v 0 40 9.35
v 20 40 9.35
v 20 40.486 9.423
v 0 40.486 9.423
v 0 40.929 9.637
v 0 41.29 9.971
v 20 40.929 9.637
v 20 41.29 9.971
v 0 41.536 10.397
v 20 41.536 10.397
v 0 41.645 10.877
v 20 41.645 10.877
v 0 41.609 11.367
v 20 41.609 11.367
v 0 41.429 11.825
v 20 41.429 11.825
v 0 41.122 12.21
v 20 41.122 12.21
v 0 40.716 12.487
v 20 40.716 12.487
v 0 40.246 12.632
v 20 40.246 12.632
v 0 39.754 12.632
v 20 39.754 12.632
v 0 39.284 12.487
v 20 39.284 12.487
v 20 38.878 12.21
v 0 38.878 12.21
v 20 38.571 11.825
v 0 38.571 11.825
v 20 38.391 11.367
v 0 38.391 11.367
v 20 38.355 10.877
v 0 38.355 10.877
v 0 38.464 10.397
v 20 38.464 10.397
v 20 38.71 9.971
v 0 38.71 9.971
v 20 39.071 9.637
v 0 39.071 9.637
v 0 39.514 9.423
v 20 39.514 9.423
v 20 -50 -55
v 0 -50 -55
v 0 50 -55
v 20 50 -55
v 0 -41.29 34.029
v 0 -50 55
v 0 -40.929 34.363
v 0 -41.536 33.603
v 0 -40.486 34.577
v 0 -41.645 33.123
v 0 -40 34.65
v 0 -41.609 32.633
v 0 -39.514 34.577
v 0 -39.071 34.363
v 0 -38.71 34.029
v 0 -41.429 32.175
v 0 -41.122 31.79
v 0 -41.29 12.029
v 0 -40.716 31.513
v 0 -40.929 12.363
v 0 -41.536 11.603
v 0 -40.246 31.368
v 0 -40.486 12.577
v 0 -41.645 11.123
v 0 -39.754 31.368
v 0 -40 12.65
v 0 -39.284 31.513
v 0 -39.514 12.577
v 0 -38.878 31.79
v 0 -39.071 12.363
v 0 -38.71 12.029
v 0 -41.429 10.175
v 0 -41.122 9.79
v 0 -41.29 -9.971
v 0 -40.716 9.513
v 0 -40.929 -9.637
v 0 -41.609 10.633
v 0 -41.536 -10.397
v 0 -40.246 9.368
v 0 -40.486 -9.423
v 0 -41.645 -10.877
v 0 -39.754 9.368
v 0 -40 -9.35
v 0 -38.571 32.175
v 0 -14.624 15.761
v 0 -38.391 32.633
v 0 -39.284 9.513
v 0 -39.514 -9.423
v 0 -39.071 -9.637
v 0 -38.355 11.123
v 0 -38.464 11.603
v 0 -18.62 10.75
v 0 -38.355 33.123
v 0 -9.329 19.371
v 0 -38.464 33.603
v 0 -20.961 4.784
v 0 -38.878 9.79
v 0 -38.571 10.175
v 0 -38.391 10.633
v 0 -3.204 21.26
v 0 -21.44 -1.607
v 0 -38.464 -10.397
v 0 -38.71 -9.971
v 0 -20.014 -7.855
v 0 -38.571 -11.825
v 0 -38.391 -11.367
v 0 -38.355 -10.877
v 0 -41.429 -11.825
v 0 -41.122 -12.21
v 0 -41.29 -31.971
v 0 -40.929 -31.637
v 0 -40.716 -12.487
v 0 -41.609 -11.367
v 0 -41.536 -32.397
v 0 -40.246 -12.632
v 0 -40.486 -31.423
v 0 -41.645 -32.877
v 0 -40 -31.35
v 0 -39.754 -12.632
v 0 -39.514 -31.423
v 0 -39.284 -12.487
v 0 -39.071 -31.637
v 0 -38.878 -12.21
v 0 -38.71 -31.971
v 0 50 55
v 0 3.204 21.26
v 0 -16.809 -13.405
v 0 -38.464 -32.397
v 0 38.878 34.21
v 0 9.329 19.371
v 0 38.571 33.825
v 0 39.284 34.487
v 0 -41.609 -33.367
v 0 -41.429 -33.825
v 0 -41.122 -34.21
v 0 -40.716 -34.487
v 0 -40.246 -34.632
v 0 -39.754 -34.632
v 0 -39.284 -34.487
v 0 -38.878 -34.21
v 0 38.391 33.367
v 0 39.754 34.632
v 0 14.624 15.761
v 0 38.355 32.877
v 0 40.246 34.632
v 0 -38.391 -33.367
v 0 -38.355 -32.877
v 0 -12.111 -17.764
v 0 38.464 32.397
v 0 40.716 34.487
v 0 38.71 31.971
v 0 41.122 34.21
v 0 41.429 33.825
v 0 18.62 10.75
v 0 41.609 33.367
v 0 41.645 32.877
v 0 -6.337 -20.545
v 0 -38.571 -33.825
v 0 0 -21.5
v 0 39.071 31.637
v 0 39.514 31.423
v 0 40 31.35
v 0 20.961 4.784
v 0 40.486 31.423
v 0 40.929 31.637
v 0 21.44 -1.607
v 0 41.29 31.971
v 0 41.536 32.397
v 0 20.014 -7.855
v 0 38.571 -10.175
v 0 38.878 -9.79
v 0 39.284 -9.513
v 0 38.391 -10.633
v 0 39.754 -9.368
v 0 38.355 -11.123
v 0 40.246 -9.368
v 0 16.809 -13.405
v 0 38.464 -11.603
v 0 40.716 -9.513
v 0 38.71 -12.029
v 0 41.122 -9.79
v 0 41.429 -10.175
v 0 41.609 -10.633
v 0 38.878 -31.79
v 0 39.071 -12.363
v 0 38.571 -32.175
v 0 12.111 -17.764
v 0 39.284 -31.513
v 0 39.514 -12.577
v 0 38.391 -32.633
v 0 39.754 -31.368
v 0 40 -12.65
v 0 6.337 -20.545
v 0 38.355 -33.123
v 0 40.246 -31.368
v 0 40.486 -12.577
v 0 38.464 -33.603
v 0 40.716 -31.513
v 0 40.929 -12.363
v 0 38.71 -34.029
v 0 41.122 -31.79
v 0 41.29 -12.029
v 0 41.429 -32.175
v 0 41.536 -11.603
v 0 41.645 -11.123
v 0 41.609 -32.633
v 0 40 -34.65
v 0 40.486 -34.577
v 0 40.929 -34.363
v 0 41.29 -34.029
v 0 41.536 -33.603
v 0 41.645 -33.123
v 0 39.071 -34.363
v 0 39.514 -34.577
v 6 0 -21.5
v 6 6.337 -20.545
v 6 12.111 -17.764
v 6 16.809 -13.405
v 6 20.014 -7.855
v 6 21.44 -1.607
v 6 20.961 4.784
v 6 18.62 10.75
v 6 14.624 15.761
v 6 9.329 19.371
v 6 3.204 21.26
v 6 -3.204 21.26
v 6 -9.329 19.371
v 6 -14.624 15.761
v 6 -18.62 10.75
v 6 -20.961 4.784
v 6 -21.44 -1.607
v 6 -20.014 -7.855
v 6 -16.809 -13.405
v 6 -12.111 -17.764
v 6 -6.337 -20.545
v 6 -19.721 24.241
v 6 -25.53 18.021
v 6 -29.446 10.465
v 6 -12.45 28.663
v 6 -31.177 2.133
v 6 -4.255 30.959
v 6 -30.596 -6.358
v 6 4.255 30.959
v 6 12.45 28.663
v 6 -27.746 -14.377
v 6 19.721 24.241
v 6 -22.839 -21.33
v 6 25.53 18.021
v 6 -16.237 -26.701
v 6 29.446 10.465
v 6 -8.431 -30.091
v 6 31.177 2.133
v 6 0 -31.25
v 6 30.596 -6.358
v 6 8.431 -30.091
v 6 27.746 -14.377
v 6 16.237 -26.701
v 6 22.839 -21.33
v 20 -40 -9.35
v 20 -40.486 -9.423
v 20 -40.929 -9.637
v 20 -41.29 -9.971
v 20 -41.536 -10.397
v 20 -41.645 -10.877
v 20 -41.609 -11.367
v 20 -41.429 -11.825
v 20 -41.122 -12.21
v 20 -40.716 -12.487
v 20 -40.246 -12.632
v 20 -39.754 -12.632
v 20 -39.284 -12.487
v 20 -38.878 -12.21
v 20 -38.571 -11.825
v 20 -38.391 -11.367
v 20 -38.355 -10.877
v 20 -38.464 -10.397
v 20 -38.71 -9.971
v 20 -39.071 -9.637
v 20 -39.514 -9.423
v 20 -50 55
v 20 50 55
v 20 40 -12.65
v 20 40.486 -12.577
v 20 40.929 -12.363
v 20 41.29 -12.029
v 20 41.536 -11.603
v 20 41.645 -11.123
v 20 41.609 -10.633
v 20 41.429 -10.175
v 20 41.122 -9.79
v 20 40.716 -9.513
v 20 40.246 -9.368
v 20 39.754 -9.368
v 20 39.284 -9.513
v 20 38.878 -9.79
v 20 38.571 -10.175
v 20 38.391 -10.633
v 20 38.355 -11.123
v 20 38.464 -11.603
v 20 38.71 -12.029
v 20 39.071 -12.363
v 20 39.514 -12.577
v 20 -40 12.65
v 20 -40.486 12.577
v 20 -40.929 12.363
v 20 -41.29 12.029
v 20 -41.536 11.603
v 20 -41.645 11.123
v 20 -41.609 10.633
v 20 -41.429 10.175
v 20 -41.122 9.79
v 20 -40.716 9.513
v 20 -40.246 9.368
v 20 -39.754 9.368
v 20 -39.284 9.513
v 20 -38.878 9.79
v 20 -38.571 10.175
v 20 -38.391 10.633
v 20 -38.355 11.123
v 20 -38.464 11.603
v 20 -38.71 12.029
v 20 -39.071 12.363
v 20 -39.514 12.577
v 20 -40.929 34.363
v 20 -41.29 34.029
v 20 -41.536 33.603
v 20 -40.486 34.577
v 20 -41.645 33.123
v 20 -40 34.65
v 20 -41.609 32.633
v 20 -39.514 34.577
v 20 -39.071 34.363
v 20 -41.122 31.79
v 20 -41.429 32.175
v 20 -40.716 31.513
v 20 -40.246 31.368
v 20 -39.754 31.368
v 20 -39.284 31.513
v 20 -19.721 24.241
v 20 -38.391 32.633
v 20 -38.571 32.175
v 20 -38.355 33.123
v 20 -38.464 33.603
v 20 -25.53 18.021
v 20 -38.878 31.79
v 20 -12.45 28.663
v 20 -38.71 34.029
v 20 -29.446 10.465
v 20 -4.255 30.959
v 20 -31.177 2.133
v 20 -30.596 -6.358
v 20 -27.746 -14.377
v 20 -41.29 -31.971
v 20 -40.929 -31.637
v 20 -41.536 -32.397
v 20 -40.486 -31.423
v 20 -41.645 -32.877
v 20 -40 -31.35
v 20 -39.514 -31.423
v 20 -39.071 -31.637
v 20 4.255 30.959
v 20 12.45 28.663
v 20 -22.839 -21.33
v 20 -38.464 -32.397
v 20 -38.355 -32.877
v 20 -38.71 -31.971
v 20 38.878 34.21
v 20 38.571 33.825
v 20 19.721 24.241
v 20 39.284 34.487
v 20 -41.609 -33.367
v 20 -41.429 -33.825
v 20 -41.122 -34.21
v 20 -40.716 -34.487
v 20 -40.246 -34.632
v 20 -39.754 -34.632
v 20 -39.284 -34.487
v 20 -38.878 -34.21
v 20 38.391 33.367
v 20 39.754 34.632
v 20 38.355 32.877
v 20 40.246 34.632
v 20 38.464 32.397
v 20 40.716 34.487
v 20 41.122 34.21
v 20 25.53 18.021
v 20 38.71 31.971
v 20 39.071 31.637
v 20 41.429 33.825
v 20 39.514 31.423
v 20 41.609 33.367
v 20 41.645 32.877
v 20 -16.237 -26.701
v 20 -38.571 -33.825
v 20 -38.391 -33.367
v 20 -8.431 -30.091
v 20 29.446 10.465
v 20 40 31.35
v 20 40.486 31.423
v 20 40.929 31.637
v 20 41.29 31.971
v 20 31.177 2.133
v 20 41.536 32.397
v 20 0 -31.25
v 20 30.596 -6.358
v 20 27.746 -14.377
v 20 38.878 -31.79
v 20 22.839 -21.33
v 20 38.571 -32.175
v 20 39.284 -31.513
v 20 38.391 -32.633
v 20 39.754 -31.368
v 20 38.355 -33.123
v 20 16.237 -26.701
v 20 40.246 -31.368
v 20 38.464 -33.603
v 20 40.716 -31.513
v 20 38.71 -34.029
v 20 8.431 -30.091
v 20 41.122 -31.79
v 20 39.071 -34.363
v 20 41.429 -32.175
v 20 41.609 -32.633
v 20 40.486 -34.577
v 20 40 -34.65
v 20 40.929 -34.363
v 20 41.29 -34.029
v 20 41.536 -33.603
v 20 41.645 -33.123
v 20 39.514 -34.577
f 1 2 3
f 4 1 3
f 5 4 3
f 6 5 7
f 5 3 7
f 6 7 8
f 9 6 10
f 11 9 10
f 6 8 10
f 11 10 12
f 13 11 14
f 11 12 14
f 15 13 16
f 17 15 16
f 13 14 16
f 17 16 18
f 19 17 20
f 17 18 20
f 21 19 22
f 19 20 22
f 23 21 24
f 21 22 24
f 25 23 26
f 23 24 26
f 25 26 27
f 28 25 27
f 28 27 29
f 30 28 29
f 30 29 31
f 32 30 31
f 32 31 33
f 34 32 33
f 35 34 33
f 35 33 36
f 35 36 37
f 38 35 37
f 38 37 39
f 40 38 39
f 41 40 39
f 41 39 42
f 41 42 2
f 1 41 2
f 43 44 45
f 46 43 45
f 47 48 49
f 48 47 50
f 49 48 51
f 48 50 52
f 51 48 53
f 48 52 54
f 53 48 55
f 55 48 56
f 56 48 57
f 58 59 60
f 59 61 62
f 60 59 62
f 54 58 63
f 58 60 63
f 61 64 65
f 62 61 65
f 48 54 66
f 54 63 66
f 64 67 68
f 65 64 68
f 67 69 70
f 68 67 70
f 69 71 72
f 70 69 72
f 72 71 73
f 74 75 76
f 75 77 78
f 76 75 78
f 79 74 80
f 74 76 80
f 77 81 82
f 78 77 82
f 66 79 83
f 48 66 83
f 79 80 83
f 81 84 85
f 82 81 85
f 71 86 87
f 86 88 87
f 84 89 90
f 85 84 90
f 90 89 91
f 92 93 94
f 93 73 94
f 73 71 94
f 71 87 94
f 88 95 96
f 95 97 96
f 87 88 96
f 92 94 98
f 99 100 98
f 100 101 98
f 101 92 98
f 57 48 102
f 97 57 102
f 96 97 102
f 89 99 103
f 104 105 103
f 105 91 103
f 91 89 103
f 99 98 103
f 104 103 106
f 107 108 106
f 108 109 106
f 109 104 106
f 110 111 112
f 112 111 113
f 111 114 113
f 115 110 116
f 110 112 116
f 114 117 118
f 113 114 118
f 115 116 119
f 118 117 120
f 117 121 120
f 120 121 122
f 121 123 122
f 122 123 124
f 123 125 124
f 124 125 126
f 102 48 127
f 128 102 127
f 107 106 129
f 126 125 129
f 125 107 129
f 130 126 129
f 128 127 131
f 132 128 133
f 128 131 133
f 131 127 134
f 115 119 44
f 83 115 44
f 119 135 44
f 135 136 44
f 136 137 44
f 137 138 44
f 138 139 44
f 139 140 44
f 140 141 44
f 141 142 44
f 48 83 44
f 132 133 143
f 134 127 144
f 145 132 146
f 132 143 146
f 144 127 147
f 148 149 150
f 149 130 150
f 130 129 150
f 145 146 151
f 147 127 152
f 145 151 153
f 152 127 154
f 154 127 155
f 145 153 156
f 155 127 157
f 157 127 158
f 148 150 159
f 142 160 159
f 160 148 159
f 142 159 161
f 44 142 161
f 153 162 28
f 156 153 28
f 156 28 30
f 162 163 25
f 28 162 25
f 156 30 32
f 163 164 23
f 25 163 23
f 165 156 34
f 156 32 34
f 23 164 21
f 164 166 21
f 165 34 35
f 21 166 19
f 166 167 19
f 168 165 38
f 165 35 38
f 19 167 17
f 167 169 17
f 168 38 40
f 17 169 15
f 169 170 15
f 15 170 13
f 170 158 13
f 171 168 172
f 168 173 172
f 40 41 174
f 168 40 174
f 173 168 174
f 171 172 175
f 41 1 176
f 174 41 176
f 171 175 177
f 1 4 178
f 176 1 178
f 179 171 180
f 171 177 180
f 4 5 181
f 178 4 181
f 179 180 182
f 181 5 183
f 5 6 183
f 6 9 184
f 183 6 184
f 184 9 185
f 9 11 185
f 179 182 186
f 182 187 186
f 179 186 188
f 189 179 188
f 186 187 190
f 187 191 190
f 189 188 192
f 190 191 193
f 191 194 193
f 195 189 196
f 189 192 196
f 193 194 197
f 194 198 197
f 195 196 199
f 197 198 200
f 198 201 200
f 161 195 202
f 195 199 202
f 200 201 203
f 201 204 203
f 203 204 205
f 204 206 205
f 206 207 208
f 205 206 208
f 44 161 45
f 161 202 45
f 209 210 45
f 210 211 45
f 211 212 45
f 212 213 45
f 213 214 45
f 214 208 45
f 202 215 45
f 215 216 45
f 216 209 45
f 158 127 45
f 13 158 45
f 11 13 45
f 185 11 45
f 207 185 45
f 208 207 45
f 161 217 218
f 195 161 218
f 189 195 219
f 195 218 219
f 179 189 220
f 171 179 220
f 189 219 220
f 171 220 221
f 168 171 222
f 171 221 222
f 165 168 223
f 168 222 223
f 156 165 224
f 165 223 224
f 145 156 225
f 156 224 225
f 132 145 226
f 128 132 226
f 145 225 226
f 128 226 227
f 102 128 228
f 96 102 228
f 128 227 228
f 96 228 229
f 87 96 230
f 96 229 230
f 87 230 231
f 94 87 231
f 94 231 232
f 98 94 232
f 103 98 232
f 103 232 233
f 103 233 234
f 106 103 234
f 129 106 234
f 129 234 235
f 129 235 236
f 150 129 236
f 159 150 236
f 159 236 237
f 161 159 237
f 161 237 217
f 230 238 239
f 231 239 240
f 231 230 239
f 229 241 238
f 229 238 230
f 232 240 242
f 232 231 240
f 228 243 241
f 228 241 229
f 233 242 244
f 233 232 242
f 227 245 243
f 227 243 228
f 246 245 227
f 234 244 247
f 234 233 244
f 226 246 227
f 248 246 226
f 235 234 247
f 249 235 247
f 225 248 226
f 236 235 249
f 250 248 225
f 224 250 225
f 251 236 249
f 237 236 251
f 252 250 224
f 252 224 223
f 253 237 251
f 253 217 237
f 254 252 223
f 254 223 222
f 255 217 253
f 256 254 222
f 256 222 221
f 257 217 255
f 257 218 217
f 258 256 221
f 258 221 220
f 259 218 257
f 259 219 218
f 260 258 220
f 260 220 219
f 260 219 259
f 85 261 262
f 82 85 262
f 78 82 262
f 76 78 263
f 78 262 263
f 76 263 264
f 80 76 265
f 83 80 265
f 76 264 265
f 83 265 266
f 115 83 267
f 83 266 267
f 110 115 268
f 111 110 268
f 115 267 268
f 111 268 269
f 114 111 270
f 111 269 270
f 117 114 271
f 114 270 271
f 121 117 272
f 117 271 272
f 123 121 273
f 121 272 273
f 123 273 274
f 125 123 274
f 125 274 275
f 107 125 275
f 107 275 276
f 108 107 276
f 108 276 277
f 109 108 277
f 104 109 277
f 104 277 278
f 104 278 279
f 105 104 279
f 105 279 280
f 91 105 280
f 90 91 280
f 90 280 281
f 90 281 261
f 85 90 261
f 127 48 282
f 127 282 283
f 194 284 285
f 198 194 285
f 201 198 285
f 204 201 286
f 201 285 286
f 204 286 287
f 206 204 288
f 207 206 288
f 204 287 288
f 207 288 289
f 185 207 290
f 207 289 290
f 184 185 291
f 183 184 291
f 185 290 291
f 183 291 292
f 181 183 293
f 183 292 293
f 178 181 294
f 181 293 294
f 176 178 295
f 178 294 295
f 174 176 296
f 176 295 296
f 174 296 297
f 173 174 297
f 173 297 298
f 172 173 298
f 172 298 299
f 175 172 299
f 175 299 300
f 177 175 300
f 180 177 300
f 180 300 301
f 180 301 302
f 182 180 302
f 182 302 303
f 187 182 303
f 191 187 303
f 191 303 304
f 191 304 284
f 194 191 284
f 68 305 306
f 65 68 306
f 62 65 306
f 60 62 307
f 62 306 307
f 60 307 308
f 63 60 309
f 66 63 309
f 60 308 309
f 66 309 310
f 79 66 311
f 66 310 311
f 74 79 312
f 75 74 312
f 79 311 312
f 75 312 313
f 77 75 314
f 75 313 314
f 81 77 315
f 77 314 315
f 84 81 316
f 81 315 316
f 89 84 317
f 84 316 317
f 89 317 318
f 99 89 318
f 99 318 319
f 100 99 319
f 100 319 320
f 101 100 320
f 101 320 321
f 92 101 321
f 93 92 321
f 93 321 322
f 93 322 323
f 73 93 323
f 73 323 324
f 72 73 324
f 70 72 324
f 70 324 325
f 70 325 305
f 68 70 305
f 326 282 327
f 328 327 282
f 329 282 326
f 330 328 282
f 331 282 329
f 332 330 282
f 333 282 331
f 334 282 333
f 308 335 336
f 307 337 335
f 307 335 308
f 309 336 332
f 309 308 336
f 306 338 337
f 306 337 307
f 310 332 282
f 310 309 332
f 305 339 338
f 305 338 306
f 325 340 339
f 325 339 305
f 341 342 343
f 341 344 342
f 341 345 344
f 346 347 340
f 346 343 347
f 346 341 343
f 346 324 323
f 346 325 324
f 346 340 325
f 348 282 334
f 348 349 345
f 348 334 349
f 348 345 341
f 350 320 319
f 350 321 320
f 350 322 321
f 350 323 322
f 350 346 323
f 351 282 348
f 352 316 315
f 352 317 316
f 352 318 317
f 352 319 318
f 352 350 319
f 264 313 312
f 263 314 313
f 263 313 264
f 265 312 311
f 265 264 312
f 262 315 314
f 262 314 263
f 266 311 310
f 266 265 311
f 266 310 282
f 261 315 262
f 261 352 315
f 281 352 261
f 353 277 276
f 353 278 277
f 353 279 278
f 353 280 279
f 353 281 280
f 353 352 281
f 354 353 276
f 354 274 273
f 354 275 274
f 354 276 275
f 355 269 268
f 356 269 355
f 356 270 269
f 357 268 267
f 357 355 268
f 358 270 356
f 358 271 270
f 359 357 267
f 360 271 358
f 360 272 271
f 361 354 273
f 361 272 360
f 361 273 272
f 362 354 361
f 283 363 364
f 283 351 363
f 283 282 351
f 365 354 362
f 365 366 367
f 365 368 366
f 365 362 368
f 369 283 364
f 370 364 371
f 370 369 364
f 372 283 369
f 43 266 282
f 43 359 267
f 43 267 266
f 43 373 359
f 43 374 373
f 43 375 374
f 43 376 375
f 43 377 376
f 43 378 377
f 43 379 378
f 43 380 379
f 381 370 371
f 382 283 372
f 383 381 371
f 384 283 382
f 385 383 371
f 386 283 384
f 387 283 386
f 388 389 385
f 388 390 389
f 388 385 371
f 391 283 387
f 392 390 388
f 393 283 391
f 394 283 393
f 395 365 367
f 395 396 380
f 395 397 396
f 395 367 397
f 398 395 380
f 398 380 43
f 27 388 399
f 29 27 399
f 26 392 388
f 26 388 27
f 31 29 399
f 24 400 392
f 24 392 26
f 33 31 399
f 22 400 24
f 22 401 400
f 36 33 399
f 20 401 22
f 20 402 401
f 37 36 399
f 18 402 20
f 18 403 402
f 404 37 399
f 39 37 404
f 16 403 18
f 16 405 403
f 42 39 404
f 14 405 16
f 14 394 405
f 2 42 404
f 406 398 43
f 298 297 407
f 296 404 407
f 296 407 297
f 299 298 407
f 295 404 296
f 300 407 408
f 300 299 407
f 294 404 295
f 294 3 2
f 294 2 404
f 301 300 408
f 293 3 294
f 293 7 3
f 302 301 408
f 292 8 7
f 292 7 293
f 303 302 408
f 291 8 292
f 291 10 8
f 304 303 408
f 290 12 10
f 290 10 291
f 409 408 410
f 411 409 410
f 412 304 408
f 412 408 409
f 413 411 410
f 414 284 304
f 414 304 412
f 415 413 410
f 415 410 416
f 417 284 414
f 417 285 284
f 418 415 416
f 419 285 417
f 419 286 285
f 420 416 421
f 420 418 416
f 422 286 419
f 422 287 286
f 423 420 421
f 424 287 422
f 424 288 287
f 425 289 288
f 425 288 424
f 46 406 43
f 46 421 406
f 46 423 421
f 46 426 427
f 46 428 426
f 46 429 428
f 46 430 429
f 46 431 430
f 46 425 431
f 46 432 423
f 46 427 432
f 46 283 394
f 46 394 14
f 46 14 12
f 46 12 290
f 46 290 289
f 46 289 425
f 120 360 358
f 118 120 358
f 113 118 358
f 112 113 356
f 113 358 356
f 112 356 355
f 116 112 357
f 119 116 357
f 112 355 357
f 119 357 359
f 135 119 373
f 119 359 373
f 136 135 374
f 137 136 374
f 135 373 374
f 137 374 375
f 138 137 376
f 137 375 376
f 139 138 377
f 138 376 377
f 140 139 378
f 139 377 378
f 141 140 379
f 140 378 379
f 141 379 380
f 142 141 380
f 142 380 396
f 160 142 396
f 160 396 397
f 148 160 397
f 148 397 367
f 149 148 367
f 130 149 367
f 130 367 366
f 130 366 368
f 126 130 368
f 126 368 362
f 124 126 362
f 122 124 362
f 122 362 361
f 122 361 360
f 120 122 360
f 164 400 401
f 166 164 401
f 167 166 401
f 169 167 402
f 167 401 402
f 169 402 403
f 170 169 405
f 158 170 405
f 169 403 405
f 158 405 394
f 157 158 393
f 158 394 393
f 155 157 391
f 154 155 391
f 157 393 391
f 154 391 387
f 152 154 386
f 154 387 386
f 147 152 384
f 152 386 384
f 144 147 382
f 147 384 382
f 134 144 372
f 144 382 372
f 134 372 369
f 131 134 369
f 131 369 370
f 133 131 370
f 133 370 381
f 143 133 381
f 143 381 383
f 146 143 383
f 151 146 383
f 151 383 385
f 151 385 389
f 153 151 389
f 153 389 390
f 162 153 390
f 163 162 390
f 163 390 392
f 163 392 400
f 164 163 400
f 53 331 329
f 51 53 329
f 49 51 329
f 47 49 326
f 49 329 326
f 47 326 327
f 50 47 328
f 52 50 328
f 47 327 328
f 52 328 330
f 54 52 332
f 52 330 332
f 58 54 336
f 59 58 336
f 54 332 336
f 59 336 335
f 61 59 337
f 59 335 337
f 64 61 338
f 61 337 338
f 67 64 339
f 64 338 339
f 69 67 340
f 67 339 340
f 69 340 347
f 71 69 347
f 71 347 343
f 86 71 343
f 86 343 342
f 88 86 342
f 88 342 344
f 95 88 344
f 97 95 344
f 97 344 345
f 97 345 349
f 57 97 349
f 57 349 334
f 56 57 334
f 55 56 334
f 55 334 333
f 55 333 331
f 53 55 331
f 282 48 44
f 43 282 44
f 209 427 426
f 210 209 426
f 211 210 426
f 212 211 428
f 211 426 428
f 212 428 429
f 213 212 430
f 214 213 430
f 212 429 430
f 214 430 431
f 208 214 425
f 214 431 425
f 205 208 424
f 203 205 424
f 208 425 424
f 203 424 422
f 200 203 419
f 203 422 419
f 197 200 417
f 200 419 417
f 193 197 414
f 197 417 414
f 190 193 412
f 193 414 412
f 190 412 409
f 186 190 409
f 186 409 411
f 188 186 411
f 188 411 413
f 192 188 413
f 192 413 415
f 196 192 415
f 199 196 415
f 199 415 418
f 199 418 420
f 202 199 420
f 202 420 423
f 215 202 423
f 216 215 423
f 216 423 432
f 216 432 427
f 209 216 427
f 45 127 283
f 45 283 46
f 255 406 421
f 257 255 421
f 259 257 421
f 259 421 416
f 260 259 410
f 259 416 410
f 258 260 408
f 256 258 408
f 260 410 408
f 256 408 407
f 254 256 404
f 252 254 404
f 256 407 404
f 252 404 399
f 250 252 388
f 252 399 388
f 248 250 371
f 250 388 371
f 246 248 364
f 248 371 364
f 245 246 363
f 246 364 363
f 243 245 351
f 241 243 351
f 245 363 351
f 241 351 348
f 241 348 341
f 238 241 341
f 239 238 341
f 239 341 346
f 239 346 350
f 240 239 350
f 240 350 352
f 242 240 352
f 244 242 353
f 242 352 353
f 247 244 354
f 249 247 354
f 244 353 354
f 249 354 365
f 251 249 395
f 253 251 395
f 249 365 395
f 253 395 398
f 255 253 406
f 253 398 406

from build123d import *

# Parameters (mm, degrees)
SKETCH_1_W          = 110
SKETCH_1_H          = 100
EXTRUDE_1_DEPTH     = 20
SKETCH_2_R          = 31.25
CUT_EXTRUDE_1_DEPTH = 14
SKETCH_3_R          = 21.5
CUT_EXTRUDE_2_DEPTH = 14
SKETCH_4_R          = 1.65
CUT_EXTRUDE_3_DEPTH = 77.974021592


with BuildPart() as part:
    # 草图1 → 凸台-拉伸1 (new body)
    with BuildSketch(Plane(origin=(0, 0, 0), x_dir=(0, 0, -1), z_dir=(1, 0, 0))):
        Rectangle(SKETCH_1_W, SKETCH_1_H)
    extrude(amount=EXTRUDE_1_DEPTH)

    # 草图2 → 切除-拉伸1 (cut)
    with BuildSketch(Plane(origin=(20, 0, 0), x_dir=(0, 0, -1), z_dir=(1, 0, 0))):
        Circle(SKETCH_2_R)
    extrude(amount=-CUT_EXTRUDE_1_DEPTH, mode=Mode.SUBTRACT)

    # 草图3 → 切除-拉伸2 (cut)
    with BuildSketch(Plane(origin=(6, 0, 0), x_dir=(0, 0, -1), z_dir=(1, 0, 0))):
        Circle(SKETCH_3_R)
    extrude(amount=-CUT_EXTRUDE_2_DEPTH, mode=Mode.SUBTRACT)

    # 草图4 → 切除-拉伸3 (cut, through all)
    with BuildSketch(Plane(origin=(20, 0, 0), x_dir=(0, 0, -1), z_dir=(1, 0, 0))):
        with Locations((33, 40)):
            Circle(SKETCH_4_R)
        with Locations((11, 40)):
            Circle(SKETCH_4_R)
        with Locations((-11, 40)):
            Circle(SKETCH_4_R)
        with Locations((-33, 40)):
            Circle(SKETCH_4_R)
        with Locations(Location((-11, -40, 0), (0, 0, 180))):
            Circle(SKETCH_4_R)
        with Locations(Location((11, -40, 0), (0, 0, 180))):
            Circle(SKETCH_4_R)
        with Locations(Location((33, -40, 0), (0, 0, 180))):
            Circle(SKETCH_4_R)
        with Locations(Location((-33, -40, 0), (0, 0, 180))):
            Circle(SKETCH_4_R)
    extrude(amount=-CUT_EXTRUDE_3_DEPTH, mode=Mode.SUBTRACT)


solid = part.part
